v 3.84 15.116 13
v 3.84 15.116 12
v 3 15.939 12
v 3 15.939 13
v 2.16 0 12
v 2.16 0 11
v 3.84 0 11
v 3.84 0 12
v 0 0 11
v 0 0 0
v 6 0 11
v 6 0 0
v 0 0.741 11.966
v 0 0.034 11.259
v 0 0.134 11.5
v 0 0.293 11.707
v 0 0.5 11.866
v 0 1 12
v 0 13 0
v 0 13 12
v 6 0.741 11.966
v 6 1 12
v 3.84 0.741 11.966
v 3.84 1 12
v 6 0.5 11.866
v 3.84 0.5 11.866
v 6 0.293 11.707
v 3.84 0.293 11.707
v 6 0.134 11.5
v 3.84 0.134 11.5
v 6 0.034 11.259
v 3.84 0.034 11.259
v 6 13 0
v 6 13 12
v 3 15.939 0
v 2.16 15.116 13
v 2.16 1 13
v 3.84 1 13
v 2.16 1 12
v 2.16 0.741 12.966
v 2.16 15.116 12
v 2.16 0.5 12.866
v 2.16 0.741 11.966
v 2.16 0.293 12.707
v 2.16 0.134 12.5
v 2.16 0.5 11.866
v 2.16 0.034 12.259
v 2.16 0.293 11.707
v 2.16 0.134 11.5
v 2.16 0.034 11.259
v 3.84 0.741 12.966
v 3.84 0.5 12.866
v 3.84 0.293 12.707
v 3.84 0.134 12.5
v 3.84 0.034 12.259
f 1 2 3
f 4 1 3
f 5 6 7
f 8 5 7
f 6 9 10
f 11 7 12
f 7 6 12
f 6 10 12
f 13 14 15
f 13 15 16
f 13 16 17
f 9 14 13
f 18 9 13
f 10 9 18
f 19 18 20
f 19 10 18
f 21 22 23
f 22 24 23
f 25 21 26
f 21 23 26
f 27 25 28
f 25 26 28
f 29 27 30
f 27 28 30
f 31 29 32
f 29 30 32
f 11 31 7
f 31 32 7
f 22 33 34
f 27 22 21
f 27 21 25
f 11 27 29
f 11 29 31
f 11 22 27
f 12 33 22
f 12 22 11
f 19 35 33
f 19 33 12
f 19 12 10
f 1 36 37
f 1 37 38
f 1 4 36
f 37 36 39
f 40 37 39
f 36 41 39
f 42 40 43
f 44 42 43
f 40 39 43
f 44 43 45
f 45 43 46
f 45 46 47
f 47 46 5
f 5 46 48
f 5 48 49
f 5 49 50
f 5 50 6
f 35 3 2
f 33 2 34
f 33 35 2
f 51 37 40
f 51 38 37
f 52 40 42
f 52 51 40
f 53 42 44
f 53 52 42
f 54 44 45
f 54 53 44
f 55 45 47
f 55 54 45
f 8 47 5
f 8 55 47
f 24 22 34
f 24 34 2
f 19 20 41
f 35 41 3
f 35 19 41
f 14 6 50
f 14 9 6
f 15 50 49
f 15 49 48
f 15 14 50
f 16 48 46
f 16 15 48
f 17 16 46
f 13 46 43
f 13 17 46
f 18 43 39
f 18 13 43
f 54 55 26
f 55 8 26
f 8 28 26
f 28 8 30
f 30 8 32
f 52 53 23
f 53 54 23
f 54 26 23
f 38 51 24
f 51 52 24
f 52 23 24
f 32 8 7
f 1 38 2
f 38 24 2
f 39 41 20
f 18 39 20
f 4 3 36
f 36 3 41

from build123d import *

# Parameters (mm, degrees)
EXTRUSION1_DEPTH = 12
EXTRUSION2_DEPTH = 1
CONG_3_R         = 1
CONG_4_R         = 1
CONG_5_R         = 1


with BuildPart() as part:
    # Esquisse1 → Extrusion1 (new body)
    with BuildSketch(Plane.XY):
        Polygon((0, 0), (0, 13), (3, 15.939387691), (6, 13), (6, 0), align=None)
    extrude(amount=EXTRUSION1_DEPTH)

    # Esquisse3 → Extrusion2 (add)
    with BuildSketch(Plane.XY.offset(12)):
        Polygon((2.160028245, 15.116386813), (2.160028245, 0), (3.839971755, 0), (3.839971755, 15.116386813), (3, 15.939387691), align=None)
    extrude(amount=EXTRUSION2_DEPTH)

    # Congé3
    cong_3_edges = [part.edges().sort_by_distance(p)[0] for p in [
        (1.080014123, 0, 12),
    ]]
    fillet(cong_3_edges, radius=CONG_3_R)

    # Congé4
    cong_4_edges = [part.edges().sort_by_distance(p)[0] for p in [
        (4.919985877, 0, 12),
    ]]
    fillet(cong_4_edges, radius=CONG_4_R)

    # Congé5
    cong_5_edges = [part.edges().sort_by_distance(p)[0] for p in [
        (3, 0, 13),
    ]]
    fillet(cong_5_edges, radius=CONG_5_R)


solid = part.part
